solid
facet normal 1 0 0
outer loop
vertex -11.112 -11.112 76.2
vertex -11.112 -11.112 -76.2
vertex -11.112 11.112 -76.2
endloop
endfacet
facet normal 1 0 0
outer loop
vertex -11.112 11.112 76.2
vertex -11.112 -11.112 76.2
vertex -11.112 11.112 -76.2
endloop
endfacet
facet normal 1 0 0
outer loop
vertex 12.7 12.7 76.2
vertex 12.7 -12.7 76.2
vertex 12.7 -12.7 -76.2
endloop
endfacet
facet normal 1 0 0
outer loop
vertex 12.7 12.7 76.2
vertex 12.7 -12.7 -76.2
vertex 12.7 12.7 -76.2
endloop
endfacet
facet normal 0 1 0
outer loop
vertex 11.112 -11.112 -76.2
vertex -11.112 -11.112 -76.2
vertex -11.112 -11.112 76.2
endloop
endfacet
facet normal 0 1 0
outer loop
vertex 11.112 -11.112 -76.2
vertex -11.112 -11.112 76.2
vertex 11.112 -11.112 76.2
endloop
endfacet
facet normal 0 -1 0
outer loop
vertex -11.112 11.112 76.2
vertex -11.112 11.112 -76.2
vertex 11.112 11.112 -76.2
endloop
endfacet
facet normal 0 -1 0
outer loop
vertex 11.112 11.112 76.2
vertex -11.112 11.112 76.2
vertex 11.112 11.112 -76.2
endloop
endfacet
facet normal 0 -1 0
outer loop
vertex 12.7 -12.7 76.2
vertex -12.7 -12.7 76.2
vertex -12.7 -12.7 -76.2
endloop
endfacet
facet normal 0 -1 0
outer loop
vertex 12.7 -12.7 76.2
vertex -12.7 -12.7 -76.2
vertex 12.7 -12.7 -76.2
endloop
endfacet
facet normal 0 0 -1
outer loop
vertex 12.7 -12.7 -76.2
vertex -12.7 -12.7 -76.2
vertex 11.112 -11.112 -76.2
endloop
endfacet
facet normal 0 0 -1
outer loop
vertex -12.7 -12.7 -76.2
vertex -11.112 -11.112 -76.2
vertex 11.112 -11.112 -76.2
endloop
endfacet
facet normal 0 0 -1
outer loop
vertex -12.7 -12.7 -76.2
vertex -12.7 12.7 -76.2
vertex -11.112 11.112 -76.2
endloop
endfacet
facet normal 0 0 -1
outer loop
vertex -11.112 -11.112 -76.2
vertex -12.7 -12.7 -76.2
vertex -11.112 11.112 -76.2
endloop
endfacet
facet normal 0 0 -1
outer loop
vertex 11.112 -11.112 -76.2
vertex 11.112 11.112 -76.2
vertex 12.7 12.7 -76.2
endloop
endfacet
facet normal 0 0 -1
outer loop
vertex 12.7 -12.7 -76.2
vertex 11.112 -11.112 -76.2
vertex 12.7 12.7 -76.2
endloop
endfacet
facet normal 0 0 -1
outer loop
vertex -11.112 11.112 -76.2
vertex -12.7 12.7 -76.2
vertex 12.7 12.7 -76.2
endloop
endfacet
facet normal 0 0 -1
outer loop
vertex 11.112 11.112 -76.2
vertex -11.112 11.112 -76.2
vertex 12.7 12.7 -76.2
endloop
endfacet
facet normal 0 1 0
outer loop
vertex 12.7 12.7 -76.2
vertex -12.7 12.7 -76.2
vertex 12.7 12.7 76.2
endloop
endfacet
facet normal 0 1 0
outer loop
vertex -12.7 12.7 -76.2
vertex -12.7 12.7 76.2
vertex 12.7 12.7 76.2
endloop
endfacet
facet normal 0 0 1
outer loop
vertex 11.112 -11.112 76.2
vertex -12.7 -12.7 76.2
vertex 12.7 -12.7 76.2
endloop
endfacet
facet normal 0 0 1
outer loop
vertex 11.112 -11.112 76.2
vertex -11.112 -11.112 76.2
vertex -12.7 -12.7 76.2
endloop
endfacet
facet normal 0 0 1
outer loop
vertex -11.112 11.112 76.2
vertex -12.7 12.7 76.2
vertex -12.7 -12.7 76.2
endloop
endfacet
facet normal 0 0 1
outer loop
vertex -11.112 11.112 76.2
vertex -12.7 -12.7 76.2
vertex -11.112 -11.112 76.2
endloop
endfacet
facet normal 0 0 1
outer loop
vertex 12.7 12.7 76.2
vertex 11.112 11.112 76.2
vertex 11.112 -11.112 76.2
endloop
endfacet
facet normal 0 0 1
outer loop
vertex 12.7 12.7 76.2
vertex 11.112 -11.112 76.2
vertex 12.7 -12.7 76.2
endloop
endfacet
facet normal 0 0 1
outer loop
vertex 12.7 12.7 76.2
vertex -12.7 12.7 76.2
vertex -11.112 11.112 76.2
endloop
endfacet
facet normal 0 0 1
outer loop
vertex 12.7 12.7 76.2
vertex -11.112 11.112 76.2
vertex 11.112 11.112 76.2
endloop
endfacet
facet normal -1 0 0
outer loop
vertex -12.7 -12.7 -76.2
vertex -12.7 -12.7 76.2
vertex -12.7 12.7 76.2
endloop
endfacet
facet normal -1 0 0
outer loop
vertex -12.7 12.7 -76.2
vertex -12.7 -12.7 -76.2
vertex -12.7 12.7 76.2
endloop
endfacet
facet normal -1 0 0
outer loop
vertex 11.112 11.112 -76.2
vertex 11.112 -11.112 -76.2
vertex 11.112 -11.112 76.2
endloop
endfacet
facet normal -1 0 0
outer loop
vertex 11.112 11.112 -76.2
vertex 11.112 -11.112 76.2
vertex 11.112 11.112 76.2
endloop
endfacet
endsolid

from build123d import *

# Parameters (mm, degrees)
SKETCH3_W                = 25.4
SKETCH3_H                = 25.4
SKETCH3_W_2              = 22.225
SKETCH3_H_2              = 22.225
BOSS_EXTRUDE1_DEPTH      = 76.2
BOSS_EXTRUDE1_DEPTH_BACK = 76.2


with BuildPart() as part:
    # Sketch3 → Boss-Extrude1 (new body, two sides)
    with BuildSketch(Plane.XY) as boss_extrude1_sk:
        Rectangle(SKETCH3_W, SKETCH3_H)
        Rectangle(SKETCH3_W_2, SKETCH3_H_2, mode=Mode.SUBTRACT)
    extrude(amount=BOSS_EXTRUDE1_DEPTH)
    extrude(boss_extrude1_sk.sketch, amount=-BOSS_EXTRUDE1_DEPTH_BACK)


solid = part.part
